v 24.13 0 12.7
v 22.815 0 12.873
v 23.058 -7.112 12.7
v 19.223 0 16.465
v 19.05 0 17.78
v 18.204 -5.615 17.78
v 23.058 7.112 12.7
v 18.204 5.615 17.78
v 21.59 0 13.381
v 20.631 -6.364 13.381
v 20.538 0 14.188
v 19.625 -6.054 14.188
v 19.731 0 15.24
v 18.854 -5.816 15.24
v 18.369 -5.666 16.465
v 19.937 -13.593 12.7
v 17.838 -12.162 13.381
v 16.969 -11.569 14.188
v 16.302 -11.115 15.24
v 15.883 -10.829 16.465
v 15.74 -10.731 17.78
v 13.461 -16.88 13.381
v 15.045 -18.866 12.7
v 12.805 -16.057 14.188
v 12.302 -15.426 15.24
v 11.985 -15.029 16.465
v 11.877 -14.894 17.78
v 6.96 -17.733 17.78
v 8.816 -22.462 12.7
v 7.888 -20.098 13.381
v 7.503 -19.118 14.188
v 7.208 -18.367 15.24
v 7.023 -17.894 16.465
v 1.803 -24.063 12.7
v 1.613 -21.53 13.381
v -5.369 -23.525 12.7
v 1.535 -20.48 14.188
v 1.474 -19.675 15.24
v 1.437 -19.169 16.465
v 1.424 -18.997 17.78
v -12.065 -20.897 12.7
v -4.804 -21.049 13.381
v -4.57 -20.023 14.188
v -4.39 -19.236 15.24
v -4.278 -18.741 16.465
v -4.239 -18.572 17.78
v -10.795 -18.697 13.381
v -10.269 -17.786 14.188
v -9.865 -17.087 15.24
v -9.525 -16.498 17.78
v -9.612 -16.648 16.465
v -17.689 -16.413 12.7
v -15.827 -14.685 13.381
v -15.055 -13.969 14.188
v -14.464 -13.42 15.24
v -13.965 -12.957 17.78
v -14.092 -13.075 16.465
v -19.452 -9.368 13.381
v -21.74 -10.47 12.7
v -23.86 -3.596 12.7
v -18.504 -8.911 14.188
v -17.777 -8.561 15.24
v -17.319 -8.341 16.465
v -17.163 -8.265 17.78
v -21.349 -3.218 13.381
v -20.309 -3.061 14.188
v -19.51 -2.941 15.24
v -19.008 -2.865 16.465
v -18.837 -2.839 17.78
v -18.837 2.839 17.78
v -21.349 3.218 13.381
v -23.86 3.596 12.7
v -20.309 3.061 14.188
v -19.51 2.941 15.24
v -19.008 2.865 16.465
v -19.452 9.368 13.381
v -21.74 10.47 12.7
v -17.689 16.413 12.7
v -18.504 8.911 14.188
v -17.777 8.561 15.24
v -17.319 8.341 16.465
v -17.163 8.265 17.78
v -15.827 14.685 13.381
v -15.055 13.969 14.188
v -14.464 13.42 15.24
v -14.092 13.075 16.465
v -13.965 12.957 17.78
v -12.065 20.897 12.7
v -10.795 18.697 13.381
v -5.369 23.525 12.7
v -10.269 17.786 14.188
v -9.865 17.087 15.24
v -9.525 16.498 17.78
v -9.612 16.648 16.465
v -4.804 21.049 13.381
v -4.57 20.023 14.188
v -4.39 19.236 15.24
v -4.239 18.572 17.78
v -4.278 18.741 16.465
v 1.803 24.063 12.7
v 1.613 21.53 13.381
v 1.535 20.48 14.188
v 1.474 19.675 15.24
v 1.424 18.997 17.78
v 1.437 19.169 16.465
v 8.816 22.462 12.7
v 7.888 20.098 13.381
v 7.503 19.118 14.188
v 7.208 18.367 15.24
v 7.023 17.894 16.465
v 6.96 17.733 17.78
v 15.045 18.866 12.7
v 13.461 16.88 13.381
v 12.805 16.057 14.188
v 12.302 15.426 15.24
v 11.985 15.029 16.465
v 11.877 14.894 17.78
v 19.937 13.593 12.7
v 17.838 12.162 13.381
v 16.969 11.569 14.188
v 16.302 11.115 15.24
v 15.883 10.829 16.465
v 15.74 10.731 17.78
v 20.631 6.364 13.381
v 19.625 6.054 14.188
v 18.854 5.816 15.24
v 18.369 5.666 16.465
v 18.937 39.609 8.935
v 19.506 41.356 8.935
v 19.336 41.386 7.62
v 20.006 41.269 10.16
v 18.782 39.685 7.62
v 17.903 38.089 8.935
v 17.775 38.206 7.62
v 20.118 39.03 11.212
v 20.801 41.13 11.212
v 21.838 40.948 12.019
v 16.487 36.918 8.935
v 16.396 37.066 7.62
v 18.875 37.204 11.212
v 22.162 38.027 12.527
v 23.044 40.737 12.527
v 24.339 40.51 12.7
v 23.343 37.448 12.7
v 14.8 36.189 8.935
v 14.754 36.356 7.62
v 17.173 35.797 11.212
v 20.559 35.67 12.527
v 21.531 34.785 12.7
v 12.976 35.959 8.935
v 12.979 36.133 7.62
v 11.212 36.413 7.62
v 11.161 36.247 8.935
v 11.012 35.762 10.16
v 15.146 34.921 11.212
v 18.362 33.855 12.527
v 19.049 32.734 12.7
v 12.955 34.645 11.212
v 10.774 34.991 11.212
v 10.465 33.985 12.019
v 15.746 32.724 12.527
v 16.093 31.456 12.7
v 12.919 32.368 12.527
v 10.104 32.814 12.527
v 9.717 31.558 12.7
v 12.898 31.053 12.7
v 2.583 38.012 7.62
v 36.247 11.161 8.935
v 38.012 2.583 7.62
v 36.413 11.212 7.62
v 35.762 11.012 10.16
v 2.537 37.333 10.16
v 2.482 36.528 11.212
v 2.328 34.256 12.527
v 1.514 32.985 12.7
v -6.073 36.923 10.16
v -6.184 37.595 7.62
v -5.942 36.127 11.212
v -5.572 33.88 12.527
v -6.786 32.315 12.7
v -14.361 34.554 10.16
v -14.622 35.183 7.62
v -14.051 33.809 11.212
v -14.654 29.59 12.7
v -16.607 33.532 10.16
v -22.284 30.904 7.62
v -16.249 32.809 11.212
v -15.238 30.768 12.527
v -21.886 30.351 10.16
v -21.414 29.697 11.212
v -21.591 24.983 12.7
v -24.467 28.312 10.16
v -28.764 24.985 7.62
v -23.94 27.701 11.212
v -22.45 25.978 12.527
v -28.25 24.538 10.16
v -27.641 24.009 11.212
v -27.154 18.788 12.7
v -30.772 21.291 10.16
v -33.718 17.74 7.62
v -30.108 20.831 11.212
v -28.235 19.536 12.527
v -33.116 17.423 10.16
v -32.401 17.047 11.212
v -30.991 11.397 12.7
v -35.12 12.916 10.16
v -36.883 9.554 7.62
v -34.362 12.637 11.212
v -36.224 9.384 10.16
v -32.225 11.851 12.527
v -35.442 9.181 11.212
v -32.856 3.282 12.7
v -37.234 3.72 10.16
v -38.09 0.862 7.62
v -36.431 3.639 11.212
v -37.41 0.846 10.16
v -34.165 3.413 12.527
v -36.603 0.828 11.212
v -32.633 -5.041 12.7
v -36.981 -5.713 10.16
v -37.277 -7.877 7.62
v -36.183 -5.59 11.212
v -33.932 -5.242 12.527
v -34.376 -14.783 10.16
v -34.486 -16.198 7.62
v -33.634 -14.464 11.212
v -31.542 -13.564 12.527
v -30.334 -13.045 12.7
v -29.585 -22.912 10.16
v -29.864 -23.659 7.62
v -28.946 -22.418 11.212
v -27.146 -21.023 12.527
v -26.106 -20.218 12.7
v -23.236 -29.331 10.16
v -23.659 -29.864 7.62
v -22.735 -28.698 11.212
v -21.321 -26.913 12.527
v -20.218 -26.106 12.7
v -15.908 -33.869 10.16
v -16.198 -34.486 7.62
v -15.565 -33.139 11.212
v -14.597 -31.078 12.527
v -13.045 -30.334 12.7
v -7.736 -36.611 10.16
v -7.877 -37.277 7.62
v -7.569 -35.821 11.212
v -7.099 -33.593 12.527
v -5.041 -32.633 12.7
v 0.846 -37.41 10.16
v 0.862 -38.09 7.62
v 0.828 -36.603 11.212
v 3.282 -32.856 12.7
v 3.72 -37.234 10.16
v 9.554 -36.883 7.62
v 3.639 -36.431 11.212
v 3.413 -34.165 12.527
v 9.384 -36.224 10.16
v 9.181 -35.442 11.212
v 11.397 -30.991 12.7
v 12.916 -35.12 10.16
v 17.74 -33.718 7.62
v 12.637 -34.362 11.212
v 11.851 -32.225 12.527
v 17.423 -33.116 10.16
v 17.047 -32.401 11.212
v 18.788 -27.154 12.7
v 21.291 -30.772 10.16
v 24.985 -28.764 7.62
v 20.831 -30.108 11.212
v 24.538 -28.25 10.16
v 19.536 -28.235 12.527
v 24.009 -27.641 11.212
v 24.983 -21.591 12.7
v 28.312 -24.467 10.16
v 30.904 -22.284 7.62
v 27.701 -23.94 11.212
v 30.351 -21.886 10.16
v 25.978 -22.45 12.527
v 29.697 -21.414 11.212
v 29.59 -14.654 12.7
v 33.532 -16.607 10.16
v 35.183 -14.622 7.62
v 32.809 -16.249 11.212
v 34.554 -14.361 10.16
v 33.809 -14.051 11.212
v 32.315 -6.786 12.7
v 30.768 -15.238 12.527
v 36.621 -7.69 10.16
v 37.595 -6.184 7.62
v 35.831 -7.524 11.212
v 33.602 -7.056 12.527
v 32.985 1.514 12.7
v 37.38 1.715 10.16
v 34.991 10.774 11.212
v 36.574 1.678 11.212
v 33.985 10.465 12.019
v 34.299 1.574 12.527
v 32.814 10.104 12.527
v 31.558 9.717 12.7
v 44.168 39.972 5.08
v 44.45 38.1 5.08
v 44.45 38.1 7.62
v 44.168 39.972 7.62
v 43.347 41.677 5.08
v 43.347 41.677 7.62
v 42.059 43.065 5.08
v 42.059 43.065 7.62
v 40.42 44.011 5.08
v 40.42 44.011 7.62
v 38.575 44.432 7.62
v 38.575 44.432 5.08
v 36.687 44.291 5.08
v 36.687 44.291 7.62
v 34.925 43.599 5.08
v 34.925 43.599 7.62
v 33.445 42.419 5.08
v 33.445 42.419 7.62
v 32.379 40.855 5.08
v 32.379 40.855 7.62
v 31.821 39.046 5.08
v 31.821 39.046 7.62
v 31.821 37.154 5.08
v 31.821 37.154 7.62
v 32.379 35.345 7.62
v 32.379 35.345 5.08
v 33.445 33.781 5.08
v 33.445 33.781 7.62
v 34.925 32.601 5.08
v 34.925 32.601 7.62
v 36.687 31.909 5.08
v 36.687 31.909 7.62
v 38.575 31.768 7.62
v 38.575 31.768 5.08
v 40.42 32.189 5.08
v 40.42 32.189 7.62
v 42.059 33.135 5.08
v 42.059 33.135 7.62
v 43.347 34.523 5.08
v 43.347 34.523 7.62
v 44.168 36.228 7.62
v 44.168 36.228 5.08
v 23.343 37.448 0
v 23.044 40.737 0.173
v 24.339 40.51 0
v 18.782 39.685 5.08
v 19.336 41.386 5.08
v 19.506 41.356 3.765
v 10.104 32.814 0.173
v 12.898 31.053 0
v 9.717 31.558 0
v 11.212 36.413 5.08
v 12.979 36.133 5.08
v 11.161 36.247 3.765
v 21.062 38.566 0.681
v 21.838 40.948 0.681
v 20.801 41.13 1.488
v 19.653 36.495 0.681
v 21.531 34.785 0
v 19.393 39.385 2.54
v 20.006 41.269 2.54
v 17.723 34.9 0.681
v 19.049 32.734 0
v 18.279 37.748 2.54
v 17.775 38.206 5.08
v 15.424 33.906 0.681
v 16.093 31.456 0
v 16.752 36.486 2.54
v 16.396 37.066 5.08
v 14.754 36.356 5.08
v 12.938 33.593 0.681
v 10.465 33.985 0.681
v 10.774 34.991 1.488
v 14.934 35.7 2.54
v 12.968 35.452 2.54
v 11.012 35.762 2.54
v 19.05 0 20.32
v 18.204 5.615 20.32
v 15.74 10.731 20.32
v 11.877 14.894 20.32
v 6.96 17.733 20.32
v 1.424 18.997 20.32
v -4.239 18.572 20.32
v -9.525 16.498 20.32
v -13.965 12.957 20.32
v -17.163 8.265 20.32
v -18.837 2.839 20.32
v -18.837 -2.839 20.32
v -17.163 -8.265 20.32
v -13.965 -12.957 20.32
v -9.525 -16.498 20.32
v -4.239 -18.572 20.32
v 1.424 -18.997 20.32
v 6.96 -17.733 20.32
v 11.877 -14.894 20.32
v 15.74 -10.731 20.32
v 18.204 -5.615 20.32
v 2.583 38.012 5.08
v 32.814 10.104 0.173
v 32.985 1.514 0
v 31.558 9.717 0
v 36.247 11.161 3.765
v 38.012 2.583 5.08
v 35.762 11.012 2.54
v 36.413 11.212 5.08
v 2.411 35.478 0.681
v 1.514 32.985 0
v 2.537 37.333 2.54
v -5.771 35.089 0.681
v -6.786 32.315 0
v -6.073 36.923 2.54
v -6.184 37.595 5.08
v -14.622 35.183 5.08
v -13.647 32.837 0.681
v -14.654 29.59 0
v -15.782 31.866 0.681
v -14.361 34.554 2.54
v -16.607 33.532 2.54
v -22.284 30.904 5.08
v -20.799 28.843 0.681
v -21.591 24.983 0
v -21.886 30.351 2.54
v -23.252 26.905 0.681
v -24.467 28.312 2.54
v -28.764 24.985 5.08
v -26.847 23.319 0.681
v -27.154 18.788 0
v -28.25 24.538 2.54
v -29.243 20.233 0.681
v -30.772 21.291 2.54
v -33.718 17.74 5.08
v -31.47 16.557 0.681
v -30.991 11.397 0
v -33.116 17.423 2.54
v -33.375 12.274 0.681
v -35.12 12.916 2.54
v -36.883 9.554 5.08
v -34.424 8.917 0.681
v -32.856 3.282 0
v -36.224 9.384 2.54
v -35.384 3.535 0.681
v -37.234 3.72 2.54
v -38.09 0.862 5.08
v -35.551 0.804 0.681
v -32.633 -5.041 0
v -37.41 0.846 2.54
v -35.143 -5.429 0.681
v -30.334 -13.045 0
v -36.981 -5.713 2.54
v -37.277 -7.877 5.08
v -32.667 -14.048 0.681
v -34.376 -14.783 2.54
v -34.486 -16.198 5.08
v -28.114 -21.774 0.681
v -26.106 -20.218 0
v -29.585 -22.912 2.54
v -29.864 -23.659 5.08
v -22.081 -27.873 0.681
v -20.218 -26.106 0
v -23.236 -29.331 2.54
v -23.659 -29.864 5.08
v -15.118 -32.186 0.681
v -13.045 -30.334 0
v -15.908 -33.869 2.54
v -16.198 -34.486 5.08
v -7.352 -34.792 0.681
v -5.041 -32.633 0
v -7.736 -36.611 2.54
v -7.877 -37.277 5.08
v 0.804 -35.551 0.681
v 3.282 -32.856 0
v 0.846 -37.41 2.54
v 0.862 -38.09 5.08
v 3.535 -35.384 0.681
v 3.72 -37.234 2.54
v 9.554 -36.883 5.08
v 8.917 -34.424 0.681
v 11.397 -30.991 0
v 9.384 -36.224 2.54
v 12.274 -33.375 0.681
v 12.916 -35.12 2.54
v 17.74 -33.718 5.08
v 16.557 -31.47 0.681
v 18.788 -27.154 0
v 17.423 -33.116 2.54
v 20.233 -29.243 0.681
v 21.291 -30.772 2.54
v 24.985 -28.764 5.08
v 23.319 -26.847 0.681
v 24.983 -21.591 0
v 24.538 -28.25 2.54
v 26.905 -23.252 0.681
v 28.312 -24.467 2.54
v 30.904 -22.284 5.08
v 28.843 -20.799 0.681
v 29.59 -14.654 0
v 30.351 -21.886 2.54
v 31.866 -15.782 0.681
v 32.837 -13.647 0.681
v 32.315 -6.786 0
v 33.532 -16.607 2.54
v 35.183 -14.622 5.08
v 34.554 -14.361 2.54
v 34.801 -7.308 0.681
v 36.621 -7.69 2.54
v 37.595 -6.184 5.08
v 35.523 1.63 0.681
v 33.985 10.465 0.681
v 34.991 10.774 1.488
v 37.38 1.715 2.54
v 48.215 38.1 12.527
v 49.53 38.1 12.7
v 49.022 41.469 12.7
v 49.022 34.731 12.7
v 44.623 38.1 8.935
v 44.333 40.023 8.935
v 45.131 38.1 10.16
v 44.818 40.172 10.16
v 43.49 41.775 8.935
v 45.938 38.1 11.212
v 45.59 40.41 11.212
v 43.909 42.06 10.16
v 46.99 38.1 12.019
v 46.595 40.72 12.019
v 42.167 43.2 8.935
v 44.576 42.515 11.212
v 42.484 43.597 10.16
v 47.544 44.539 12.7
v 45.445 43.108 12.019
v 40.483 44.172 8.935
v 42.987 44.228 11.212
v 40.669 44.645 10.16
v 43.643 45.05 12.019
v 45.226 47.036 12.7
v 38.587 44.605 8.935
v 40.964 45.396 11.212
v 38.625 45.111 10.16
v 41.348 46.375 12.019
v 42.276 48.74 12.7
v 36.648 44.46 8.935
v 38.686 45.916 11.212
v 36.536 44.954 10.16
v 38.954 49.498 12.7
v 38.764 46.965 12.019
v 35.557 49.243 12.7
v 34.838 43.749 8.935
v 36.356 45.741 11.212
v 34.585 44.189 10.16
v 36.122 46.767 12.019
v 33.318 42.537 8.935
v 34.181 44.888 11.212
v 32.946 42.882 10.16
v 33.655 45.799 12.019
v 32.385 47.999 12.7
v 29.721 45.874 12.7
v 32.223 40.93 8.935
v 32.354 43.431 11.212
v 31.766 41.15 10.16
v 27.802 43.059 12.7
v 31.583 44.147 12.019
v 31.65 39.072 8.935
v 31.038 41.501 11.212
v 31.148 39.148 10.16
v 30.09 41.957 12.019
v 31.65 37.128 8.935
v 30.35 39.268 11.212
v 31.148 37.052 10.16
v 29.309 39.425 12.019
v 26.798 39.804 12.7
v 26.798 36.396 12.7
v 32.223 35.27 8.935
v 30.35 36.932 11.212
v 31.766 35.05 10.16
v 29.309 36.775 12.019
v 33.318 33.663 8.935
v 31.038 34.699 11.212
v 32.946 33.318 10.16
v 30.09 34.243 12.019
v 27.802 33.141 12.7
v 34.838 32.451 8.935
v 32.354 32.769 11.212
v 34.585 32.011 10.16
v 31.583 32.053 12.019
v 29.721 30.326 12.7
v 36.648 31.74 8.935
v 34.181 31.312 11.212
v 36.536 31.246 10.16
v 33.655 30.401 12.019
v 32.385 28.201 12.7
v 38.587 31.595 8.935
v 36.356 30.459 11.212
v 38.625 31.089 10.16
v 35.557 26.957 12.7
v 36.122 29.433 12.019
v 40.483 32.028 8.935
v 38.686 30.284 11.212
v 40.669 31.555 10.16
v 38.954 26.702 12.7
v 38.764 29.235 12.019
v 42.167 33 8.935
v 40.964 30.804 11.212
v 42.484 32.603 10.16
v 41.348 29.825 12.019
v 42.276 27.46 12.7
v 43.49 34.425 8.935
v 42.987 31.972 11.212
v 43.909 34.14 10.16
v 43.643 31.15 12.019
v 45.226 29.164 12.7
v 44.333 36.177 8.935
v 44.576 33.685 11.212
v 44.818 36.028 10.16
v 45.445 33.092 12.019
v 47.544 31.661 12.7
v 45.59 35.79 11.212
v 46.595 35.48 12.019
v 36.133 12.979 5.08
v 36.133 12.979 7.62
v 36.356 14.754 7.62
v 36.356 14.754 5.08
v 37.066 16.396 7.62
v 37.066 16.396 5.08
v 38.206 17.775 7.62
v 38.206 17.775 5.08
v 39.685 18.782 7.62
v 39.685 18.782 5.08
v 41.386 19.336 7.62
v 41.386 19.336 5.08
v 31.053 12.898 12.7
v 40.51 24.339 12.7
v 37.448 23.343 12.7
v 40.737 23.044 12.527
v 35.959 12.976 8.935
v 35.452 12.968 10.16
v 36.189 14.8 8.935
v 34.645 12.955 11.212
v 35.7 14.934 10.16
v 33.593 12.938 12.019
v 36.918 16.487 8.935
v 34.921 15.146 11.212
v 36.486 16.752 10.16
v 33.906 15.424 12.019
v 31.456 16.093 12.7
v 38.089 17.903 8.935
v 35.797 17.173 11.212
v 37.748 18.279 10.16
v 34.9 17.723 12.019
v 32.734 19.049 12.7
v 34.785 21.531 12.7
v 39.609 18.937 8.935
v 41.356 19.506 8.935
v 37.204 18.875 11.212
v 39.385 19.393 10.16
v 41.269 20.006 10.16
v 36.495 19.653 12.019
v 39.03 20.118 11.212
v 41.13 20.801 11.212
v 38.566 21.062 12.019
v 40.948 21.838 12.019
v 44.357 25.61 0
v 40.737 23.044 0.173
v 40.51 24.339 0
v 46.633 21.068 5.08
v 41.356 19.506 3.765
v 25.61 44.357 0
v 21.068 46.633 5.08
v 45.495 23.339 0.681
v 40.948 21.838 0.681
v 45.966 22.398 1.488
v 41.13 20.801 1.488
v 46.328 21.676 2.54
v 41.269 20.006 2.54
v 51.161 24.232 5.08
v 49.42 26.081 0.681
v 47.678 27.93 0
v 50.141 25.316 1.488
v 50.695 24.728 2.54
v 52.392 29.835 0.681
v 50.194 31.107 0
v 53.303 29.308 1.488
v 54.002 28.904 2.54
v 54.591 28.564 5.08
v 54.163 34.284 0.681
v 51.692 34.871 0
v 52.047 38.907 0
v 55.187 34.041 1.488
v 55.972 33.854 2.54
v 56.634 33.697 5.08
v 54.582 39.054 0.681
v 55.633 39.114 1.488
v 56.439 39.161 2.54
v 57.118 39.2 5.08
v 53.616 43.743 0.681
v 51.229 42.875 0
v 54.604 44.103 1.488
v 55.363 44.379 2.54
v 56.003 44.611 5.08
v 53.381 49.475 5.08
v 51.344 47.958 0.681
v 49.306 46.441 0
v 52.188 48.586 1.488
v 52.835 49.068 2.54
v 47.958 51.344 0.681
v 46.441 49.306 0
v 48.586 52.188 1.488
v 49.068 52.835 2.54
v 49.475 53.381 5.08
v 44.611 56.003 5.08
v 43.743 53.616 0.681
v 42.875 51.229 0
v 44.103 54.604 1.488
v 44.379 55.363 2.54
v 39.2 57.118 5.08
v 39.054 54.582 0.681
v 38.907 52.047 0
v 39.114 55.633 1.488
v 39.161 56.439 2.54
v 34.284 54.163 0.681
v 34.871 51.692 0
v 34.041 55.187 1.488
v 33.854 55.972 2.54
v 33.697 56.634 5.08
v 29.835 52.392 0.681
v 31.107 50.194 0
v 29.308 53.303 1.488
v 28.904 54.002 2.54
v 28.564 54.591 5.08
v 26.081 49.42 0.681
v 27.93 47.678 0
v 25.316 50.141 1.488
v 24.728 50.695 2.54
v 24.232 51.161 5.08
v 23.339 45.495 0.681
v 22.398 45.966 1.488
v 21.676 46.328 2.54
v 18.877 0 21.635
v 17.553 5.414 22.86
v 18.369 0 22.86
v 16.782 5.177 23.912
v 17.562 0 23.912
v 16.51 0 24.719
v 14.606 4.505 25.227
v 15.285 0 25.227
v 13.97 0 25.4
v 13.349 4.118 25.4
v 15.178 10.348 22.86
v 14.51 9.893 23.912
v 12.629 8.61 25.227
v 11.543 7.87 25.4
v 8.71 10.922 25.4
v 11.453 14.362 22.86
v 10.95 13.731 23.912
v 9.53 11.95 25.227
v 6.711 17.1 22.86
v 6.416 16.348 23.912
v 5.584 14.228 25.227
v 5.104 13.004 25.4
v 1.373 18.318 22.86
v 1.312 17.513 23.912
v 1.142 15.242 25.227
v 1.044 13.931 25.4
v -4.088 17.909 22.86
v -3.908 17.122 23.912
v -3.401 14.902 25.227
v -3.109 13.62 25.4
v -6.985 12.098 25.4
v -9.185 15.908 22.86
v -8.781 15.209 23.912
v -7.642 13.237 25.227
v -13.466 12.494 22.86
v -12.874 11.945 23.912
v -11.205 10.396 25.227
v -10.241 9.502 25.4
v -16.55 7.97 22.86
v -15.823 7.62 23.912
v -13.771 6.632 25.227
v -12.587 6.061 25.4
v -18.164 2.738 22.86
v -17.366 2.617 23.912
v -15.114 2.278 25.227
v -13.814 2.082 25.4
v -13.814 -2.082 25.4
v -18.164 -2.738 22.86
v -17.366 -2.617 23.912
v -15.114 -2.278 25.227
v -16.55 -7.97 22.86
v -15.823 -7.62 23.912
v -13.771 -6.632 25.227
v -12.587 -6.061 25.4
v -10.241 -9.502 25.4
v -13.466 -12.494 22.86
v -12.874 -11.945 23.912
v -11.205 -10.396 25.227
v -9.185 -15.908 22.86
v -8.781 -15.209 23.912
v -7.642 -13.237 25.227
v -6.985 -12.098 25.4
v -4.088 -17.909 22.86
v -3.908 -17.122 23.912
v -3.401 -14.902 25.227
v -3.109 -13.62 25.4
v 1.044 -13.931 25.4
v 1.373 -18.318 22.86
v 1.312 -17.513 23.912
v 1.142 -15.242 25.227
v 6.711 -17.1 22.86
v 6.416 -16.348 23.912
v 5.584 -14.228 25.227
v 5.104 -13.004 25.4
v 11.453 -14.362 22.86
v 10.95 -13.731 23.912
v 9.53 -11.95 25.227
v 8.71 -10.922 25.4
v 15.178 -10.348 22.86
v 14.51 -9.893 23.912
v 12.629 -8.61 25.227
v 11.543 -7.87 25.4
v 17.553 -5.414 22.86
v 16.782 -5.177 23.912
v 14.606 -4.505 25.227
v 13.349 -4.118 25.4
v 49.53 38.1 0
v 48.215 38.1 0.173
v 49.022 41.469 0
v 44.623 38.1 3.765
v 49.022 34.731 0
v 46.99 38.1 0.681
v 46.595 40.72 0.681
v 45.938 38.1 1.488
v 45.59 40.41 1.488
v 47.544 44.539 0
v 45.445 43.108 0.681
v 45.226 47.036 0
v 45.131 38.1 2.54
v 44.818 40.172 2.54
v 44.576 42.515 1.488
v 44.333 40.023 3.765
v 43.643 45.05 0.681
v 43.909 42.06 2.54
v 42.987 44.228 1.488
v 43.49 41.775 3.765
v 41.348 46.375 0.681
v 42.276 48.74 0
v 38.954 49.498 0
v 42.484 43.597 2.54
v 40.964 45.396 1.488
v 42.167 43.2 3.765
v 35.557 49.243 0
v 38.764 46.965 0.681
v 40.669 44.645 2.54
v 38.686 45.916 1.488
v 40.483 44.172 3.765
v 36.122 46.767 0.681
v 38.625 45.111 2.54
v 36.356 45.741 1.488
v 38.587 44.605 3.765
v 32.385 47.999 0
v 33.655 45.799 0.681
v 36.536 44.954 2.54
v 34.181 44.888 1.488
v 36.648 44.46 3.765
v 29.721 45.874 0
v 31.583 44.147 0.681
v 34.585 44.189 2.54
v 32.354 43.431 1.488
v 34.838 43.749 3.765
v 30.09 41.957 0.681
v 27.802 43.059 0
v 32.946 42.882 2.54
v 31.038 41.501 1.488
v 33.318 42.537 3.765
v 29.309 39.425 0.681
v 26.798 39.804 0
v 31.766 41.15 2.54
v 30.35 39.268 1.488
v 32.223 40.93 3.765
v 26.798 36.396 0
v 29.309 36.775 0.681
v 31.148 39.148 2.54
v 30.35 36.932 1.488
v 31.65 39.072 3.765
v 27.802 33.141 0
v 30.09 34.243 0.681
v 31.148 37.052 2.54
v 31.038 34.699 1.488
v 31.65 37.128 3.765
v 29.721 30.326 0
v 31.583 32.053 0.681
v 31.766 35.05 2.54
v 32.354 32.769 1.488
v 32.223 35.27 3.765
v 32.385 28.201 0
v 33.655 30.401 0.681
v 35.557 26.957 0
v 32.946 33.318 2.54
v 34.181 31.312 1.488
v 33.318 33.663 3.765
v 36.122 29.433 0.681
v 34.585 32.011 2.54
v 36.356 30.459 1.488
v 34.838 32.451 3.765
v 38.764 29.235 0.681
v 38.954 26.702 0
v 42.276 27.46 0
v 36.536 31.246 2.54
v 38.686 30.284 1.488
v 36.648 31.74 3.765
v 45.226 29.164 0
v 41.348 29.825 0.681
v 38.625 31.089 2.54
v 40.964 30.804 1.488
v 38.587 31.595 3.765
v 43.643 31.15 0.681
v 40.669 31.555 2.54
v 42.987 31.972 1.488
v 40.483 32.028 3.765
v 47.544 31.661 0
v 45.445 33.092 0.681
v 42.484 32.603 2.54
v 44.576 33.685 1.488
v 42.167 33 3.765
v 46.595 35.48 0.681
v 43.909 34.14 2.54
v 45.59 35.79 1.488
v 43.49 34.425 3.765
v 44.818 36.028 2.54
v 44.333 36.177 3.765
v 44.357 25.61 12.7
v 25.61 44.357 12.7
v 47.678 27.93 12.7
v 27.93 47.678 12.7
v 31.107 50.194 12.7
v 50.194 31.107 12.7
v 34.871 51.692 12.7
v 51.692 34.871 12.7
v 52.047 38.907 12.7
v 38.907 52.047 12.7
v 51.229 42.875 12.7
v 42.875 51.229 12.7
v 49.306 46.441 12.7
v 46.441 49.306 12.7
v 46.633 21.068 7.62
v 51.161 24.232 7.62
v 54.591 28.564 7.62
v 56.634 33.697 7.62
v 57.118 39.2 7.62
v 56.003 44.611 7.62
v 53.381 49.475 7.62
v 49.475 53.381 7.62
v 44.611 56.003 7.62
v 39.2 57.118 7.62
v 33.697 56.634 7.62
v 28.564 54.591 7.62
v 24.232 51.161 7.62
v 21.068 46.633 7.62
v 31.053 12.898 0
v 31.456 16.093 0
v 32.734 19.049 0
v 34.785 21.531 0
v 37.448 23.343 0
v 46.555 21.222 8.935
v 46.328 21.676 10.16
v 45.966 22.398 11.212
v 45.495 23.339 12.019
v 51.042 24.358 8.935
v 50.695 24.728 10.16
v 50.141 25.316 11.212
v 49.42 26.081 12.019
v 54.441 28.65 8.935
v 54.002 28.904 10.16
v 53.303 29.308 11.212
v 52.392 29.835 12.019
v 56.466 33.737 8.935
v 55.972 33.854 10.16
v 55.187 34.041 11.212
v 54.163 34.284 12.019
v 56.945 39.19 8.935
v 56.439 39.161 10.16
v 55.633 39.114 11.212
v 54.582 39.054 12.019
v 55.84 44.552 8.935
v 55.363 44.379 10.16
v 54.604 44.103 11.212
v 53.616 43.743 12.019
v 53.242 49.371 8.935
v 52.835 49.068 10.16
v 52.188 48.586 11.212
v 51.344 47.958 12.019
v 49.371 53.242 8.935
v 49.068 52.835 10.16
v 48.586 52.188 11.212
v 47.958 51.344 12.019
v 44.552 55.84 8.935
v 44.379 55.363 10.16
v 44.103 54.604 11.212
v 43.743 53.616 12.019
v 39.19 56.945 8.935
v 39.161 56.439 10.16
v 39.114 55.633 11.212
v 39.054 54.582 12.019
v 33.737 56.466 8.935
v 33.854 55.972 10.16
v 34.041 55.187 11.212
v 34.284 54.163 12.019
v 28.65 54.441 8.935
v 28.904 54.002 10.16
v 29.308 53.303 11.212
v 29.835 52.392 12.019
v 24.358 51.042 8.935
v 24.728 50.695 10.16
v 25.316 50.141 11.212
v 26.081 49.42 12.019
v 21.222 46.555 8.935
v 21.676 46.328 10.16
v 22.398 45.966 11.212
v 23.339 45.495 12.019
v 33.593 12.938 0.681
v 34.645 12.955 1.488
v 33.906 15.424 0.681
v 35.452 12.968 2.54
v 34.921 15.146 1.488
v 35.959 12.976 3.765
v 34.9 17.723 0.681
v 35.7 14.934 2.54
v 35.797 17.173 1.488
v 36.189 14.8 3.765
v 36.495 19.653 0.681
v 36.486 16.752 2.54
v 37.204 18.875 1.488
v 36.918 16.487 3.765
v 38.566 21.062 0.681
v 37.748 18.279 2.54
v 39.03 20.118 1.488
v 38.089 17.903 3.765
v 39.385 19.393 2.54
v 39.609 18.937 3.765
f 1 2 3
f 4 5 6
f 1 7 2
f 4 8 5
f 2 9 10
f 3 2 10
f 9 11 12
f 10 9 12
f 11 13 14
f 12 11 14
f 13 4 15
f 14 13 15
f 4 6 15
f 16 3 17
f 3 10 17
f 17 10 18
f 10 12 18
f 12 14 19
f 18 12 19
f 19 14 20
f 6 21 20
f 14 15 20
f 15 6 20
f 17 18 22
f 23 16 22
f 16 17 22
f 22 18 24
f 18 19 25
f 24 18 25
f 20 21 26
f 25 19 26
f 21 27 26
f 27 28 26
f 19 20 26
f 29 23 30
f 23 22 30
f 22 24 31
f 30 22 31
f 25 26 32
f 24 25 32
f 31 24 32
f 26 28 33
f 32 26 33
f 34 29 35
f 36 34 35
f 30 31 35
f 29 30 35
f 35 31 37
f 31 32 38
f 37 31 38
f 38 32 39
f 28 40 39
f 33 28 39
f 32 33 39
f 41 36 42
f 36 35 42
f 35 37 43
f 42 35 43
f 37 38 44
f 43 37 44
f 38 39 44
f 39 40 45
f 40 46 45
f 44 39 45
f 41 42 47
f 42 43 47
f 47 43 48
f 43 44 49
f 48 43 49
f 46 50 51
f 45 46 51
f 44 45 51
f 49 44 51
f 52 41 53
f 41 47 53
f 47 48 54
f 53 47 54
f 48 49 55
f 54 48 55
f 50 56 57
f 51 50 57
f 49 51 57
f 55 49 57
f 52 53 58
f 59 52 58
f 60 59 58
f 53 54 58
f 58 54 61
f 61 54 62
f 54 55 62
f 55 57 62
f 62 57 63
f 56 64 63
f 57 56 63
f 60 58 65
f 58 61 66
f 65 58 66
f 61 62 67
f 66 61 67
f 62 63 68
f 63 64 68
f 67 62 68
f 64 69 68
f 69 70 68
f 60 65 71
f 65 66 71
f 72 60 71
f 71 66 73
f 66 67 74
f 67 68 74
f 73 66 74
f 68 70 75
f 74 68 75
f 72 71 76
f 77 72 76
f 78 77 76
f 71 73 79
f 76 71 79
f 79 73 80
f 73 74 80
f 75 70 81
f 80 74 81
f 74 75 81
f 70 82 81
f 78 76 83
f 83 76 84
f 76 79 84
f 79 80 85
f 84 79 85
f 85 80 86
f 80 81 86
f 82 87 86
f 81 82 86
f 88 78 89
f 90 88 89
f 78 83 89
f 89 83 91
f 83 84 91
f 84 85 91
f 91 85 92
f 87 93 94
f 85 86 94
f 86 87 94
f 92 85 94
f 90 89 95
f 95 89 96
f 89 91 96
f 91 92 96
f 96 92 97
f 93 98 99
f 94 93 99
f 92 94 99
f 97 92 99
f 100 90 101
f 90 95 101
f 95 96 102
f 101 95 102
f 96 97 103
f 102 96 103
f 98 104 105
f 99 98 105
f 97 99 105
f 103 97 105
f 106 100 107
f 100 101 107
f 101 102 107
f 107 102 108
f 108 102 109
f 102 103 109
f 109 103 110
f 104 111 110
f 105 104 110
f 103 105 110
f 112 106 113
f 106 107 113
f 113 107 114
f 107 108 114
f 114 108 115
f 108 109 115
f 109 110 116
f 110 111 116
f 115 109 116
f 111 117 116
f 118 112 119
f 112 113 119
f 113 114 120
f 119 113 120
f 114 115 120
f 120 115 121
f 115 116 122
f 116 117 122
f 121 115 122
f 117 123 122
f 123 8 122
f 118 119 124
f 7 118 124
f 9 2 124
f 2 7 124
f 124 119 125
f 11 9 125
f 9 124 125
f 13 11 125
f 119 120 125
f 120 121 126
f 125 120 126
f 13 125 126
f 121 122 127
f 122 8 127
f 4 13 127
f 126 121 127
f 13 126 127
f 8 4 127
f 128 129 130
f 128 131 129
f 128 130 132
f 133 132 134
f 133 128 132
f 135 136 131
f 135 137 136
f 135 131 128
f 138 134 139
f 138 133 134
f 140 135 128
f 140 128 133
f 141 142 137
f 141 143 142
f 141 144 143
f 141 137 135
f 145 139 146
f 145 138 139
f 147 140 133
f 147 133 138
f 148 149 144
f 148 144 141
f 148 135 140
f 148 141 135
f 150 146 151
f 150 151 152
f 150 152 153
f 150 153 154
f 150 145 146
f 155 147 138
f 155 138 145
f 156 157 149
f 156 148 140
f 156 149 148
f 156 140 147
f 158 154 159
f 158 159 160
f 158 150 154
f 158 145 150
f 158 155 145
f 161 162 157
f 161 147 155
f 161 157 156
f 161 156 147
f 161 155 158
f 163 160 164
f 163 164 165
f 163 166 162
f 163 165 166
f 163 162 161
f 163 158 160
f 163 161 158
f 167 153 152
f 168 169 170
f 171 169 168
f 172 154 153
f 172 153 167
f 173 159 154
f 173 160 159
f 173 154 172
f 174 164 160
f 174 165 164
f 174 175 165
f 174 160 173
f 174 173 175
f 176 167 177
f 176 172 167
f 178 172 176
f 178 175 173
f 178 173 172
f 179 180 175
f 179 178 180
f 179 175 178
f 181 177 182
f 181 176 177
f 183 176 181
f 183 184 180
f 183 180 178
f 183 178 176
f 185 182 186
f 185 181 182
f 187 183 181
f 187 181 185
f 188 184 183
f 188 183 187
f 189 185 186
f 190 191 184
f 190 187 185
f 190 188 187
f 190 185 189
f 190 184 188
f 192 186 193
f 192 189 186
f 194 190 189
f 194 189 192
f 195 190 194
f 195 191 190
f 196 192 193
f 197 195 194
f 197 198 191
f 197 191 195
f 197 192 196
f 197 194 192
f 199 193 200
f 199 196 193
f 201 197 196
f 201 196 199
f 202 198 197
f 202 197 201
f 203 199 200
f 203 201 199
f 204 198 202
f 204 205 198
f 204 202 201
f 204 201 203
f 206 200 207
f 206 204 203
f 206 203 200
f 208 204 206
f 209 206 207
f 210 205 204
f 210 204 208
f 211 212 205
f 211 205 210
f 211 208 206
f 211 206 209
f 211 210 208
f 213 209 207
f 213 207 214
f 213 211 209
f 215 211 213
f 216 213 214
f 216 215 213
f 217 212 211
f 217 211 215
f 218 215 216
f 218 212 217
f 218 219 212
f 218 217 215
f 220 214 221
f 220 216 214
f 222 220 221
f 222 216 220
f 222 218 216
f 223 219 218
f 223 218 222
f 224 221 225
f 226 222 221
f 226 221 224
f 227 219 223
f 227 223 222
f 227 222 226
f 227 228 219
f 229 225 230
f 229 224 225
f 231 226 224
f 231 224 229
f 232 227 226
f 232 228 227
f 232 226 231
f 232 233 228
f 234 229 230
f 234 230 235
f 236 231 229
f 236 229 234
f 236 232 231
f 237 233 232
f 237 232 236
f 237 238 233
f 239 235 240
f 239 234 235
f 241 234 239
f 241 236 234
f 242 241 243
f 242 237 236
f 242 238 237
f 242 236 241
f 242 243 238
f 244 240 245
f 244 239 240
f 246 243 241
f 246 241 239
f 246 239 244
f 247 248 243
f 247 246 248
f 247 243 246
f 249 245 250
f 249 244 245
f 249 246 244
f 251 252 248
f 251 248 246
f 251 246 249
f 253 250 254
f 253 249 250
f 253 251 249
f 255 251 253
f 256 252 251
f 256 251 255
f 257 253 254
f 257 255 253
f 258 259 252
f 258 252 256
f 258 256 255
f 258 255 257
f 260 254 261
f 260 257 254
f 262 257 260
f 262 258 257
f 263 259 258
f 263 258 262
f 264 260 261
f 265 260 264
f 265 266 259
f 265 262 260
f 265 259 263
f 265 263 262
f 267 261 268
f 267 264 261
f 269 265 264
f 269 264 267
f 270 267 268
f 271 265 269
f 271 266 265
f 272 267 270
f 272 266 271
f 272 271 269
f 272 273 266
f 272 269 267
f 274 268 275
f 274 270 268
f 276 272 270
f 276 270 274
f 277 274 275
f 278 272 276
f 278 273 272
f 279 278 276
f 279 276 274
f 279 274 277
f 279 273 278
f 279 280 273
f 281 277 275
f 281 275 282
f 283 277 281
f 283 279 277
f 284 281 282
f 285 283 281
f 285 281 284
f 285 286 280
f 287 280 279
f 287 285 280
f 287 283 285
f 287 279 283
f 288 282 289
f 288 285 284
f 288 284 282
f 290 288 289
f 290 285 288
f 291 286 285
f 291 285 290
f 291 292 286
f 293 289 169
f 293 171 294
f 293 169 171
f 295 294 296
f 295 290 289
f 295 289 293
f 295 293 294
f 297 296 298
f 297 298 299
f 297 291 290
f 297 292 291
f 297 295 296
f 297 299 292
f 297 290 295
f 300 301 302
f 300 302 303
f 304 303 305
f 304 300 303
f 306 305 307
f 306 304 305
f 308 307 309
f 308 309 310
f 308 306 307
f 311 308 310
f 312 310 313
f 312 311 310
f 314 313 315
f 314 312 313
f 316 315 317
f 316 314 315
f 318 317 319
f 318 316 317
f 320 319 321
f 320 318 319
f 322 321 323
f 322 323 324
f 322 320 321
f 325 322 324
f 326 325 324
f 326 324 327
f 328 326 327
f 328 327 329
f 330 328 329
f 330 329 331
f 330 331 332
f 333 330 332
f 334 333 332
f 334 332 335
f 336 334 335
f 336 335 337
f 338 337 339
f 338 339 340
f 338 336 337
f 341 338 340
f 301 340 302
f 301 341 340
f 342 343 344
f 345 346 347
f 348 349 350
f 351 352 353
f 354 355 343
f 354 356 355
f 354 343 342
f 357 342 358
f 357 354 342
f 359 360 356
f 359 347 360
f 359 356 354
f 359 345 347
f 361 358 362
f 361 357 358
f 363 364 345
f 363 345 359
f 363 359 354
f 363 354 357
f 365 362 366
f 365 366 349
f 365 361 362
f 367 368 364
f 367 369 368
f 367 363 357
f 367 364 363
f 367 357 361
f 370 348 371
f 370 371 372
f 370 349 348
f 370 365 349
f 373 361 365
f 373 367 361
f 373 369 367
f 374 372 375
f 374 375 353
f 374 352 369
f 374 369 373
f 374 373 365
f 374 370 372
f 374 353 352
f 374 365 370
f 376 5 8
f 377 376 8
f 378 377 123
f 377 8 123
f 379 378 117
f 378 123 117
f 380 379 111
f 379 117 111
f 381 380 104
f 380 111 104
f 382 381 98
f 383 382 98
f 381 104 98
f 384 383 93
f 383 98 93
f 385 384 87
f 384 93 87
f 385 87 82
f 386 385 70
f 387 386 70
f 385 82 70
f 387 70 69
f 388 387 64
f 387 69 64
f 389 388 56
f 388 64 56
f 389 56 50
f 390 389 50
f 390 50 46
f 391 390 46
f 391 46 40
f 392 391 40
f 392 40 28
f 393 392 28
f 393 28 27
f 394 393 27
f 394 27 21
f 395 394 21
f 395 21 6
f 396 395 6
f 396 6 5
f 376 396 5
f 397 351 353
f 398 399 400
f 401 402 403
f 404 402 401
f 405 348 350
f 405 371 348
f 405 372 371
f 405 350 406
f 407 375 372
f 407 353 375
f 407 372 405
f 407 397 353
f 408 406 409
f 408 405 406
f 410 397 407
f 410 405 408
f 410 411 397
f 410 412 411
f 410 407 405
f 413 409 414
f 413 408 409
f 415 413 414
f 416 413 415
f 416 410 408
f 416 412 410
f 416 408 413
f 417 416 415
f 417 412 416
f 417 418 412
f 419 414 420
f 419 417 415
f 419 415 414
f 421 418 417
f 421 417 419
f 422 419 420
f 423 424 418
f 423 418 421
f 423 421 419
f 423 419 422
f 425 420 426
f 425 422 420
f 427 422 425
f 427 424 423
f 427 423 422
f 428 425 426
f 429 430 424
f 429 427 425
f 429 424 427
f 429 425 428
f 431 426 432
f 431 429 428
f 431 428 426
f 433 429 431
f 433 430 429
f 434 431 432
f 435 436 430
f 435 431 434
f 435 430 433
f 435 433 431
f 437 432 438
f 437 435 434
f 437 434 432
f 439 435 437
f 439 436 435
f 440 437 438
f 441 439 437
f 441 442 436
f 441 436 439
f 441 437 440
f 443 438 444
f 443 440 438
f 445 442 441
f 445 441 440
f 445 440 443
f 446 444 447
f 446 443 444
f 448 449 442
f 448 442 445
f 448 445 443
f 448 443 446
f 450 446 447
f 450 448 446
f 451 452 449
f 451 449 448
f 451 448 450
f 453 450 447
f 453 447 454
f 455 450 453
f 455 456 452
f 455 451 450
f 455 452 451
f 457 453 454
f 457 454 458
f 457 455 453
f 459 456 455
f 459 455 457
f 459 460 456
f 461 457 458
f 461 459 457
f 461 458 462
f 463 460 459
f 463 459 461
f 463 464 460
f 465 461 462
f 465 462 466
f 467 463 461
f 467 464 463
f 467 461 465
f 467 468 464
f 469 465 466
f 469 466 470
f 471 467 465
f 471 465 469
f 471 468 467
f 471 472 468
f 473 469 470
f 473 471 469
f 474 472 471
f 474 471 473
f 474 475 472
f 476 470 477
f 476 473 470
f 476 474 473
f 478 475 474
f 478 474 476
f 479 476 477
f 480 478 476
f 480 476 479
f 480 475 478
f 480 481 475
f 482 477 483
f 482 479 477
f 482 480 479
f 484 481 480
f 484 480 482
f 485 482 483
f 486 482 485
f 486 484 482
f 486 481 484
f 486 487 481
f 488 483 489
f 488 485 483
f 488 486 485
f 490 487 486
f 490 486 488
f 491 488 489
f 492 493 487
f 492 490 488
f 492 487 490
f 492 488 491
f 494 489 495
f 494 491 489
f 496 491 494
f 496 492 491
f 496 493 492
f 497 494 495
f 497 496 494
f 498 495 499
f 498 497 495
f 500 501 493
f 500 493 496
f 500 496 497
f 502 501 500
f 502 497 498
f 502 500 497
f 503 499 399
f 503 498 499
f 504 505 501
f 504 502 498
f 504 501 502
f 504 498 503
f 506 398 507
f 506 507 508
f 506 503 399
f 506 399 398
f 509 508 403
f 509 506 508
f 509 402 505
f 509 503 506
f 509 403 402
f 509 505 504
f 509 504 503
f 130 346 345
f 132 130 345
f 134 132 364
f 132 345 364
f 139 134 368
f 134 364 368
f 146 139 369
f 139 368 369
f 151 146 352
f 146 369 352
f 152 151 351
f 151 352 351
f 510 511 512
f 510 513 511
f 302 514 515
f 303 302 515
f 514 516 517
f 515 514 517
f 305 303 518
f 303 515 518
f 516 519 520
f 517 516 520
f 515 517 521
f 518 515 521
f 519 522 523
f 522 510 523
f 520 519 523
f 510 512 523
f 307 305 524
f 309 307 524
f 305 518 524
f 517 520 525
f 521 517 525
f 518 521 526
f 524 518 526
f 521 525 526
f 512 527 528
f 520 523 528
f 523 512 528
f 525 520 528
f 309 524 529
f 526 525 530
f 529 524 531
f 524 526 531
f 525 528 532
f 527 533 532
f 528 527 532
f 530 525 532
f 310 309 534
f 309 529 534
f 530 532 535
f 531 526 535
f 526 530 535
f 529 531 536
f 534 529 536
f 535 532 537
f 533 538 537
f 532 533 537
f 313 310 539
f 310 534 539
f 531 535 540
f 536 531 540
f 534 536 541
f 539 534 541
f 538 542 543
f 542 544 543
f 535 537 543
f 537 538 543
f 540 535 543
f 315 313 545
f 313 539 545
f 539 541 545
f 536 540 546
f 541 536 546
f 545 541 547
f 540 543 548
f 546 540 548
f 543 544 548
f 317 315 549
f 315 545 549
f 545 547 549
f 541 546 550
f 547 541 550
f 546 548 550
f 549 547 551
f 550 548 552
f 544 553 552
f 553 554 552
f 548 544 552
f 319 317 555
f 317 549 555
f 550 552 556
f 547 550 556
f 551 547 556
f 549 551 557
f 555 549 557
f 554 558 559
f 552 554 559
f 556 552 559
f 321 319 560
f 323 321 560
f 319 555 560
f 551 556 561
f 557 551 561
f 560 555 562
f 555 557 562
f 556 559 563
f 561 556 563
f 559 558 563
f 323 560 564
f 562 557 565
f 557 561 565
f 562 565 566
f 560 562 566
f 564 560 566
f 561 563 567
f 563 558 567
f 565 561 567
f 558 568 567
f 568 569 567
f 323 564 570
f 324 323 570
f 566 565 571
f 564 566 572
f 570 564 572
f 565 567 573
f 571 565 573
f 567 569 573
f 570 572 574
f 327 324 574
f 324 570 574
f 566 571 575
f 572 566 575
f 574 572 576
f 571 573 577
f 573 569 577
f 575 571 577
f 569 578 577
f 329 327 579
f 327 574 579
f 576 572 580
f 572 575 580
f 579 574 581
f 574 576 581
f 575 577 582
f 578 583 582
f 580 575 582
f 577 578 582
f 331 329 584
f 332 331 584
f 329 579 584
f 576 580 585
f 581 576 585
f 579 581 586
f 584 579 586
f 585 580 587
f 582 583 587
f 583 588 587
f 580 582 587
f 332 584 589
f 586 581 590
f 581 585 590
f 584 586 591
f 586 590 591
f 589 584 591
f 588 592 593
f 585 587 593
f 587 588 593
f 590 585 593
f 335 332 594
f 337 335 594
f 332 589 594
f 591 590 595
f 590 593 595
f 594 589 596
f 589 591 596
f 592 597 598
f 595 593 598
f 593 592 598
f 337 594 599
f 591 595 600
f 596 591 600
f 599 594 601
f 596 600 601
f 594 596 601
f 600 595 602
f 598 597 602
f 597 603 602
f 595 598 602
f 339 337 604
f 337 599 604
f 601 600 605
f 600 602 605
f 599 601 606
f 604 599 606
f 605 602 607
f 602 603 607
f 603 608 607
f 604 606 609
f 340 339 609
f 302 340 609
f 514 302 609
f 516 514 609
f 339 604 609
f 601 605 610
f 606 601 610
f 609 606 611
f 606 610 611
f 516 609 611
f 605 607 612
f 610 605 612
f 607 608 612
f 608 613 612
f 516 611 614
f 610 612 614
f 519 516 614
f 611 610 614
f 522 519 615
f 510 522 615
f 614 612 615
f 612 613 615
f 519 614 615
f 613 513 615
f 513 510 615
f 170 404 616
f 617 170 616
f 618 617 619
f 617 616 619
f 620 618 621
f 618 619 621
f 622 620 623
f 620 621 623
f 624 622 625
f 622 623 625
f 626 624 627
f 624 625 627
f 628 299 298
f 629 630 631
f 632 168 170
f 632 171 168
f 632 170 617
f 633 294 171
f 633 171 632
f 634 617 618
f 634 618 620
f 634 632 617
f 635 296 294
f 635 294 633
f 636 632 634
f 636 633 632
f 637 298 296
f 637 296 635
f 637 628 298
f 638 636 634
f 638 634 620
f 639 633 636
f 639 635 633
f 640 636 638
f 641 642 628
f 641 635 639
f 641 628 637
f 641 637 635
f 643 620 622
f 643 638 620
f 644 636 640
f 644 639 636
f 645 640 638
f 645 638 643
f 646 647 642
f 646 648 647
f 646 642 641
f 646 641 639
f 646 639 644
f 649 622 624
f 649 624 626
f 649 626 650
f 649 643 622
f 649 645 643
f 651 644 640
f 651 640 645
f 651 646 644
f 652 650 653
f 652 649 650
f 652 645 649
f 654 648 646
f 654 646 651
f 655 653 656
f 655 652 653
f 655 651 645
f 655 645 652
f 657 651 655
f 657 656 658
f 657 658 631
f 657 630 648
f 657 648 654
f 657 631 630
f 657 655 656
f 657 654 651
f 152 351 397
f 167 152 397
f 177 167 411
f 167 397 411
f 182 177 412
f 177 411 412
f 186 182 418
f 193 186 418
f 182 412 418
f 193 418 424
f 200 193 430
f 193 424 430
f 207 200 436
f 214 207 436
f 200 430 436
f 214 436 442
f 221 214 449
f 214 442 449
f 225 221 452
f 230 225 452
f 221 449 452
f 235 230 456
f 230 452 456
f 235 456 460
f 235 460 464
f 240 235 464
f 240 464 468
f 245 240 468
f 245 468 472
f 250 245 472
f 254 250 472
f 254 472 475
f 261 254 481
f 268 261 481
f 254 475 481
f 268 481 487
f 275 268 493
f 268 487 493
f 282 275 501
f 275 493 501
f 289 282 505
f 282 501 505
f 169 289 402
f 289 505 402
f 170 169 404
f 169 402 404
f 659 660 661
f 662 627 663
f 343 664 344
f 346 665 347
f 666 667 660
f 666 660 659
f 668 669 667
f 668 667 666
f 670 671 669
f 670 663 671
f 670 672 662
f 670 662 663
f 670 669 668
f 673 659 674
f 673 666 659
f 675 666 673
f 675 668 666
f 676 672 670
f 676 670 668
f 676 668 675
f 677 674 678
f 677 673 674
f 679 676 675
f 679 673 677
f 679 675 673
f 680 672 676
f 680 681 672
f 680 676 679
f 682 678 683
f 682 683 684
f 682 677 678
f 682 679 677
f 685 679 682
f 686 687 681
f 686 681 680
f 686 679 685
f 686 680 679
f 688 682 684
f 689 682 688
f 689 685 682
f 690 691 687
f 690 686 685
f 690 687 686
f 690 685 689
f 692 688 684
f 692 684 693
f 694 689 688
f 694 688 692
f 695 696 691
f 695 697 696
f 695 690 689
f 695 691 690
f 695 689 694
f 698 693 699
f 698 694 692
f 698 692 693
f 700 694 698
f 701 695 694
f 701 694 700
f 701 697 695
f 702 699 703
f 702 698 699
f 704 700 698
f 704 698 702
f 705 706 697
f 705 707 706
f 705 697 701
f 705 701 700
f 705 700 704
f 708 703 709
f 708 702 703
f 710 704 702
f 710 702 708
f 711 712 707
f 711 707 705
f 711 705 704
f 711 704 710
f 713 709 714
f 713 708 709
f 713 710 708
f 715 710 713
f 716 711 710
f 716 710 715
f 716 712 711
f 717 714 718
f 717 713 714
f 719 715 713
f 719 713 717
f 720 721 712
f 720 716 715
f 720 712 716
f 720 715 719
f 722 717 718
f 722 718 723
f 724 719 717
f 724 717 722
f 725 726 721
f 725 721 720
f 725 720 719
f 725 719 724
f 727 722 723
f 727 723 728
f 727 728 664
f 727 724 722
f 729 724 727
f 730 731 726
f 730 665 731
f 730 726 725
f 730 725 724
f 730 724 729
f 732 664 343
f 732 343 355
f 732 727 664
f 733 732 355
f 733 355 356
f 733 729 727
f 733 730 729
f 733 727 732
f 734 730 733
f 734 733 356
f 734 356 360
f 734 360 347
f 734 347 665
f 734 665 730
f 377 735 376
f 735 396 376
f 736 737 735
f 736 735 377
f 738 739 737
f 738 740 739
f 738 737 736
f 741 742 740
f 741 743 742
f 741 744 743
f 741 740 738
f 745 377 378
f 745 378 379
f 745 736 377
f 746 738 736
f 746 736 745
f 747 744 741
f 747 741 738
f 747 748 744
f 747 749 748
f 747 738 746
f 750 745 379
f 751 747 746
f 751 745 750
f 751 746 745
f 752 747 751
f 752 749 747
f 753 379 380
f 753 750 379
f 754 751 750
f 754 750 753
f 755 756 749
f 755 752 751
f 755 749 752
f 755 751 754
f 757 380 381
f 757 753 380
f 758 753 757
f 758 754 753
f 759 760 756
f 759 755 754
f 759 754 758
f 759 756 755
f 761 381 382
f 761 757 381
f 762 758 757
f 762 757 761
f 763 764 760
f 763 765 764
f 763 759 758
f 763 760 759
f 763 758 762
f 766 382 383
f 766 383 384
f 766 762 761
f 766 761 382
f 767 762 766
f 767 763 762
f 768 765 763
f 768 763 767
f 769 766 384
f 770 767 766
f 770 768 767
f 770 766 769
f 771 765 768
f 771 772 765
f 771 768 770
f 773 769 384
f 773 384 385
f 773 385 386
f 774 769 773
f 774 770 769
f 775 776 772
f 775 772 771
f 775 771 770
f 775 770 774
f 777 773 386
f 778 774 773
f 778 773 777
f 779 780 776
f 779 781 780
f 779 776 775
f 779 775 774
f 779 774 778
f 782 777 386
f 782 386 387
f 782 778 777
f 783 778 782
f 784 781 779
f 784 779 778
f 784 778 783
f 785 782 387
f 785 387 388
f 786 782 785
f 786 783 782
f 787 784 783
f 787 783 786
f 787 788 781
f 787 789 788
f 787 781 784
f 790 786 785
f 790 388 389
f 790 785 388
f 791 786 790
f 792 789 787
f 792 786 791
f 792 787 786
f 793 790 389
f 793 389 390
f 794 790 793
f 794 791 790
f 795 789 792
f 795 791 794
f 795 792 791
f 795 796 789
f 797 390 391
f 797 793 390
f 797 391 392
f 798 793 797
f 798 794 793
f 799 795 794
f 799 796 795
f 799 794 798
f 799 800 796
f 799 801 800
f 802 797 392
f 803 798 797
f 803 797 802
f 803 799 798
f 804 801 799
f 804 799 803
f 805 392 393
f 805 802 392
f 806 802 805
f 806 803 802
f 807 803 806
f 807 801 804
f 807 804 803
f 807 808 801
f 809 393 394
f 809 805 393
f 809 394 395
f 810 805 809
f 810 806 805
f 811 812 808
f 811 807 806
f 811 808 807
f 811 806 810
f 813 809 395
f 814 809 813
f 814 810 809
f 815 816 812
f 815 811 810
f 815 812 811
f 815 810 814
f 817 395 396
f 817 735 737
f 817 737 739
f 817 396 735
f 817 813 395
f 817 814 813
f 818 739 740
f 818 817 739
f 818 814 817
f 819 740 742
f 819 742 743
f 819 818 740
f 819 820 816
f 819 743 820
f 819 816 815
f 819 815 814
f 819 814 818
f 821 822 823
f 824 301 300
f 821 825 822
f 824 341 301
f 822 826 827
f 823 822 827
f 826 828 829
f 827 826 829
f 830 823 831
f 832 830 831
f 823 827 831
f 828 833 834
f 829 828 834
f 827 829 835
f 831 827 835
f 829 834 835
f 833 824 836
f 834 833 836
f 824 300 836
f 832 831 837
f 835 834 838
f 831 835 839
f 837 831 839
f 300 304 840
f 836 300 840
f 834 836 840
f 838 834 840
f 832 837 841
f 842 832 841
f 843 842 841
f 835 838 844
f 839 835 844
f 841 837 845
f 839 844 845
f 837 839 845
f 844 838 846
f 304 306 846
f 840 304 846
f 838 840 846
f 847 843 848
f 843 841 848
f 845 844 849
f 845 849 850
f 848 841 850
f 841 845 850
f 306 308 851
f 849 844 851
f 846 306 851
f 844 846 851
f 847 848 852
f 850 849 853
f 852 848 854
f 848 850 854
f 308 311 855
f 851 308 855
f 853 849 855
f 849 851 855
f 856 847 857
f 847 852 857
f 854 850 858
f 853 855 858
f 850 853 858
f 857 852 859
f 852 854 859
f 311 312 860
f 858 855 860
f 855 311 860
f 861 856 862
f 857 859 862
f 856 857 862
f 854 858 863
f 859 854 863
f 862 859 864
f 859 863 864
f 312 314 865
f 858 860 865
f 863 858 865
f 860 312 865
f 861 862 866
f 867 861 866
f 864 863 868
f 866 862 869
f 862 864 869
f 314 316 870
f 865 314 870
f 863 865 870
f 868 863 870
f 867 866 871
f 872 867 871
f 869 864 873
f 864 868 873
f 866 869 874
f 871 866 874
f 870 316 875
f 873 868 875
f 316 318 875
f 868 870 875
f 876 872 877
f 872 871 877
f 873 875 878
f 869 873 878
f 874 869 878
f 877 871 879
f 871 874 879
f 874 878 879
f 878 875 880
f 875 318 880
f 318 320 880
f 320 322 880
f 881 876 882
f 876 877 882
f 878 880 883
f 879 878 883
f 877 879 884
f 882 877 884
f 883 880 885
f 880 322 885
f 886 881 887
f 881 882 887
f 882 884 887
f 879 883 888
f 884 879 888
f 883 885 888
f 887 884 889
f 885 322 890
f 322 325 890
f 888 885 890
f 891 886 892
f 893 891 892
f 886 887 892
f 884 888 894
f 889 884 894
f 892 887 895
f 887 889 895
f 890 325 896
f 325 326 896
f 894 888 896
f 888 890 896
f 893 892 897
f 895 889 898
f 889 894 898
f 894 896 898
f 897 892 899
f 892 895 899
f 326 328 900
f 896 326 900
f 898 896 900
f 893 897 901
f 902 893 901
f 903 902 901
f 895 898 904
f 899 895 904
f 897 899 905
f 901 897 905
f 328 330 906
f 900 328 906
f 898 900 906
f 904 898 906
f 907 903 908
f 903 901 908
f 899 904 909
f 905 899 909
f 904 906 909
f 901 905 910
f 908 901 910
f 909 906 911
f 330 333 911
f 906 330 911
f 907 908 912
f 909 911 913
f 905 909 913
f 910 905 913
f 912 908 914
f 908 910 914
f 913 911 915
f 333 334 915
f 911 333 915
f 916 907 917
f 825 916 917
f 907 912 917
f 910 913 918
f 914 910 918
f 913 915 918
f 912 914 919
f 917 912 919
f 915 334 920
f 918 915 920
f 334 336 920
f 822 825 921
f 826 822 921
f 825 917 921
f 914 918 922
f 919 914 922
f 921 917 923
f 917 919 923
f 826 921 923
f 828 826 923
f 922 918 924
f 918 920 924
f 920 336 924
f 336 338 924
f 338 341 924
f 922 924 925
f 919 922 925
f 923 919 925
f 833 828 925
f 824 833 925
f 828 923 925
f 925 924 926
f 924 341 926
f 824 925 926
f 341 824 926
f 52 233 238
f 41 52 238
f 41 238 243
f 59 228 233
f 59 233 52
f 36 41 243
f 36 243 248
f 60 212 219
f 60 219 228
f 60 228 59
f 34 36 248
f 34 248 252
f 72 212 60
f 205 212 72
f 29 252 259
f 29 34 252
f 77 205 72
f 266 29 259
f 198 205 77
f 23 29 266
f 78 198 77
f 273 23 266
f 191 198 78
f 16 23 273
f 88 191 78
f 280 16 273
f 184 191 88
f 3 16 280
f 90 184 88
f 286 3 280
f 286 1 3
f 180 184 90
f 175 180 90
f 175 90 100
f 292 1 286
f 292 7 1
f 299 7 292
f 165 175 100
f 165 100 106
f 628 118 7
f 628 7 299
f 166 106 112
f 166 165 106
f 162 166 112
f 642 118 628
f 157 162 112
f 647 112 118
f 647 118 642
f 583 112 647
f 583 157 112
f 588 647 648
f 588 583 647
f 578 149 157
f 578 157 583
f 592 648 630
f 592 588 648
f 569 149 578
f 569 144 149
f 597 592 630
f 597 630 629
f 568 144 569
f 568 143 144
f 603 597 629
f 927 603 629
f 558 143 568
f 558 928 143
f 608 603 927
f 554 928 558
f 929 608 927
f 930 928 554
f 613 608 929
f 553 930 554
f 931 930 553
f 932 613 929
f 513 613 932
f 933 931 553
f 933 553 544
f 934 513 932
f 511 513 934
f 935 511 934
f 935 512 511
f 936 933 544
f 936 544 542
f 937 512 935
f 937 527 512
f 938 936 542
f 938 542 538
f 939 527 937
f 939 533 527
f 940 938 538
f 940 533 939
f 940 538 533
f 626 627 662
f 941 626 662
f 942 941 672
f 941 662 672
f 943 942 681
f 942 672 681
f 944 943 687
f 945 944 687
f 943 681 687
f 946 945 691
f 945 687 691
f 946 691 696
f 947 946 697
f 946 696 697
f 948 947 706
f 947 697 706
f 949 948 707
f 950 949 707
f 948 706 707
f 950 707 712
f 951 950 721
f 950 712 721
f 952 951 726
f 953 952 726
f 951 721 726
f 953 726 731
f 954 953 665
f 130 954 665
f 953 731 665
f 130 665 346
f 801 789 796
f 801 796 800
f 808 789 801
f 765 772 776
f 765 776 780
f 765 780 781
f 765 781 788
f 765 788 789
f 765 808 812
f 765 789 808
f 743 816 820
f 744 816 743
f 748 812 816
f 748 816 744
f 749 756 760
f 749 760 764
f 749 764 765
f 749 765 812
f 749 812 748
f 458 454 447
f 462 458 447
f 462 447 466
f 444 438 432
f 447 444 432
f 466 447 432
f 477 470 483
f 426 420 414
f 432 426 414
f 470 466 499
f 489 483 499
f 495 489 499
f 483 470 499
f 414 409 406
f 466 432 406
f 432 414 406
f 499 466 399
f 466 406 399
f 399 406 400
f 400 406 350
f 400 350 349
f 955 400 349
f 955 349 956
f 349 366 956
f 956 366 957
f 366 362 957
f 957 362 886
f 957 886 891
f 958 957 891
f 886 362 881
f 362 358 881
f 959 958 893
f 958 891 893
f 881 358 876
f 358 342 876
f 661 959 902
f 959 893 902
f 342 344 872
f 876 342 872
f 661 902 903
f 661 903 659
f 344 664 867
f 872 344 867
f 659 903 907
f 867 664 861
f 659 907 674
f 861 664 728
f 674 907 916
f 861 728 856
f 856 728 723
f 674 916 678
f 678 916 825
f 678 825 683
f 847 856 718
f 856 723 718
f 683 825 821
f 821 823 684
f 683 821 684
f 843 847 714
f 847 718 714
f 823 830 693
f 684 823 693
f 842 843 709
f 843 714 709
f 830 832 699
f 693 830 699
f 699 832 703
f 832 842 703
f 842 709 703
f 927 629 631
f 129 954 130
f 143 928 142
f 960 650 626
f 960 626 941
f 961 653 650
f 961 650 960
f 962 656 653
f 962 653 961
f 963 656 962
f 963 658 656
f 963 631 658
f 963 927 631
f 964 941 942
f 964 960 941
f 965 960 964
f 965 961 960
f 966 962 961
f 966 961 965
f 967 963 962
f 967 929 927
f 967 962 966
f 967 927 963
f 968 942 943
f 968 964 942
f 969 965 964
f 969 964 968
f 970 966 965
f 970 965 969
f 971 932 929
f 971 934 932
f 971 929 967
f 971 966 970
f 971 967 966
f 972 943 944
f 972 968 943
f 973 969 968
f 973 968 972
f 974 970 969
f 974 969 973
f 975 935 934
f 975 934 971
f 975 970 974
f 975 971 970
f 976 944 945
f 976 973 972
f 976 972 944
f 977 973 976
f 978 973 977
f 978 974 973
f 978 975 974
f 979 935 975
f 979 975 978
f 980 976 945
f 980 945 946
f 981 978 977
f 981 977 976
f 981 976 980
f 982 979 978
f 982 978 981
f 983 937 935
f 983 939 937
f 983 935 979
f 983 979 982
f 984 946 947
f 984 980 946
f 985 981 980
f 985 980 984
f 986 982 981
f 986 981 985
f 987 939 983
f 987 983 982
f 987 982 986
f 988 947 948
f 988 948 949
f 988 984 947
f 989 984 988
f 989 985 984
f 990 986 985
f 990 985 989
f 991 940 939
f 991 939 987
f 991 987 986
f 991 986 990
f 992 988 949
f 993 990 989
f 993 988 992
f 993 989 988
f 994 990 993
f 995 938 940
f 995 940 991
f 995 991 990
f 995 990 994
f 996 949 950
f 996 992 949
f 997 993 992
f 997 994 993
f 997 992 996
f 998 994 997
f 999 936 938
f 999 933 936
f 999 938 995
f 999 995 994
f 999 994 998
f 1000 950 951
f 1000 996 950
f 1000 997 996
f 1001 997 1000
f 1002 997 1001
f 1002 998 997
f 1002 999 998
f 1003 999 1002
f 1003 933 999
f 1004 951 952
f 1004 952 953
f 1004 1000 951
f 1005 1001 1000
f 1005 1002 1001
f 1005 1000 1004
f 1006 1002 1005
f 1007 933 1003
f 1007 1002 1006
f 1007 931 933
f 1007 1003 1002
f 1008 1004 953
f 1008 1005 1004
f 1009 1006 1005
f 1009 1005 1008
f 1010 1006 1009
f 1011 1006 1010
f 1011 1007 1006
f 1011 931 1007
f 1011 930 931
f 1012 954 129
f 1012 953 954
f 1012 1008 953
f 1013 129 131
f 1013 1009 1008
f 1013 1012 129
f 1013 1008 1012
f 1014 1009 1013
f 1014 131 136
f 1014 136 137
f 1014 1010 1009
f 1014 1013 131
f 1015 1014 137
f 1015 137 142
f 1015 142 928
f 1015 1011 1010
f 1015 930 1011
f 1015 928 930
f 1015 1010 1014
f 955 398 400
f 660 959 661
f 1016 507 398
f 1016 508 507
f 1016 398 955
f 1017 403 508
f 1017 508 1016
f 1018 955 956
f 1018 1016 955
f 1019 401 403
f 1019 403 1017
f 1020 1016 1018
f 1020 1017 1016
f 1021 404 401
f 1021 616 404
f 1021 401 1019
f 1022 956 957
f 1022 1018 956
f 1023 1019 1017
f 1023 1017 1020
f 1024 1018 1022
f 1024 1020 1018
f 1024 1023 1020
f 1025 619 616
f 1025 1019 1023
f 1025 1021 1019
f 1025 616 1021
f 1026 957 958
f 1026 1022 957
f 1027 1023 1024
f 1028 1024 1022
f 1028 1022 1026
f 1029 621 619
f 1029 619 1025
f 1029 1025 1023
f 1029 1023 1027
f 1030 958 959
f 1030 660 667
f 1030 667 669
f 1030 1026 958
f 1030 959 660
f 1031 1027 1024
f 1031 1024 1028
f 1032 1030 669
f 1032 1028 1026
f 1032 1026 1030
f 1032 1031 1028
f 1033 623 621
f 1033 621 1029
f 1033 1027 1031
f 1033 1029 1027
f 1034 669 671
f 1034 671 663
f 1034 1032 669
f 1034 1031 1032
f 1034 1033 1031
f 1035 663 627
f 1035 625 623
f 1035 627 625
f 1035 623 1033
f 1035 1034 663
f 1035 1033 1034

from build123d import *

# Parameters (mm, degrees)
F0_R     = 6.35
F2_DEPTH = 12.7
F1_R     = 19.05
F3_DEPTH = 25.4
F4_R     = 5.08


with BuildPart() as f2:
    # F0 (on Top) → F2 (new body)
    with BuildSketch(Plane.XY):
        with BuildLine():
            ThreePointArc((19.335596, 41.386279), (16.396387, 37.066048), (11.212109, 36.412891))
            ThreePointArc((11.212109, 36.412891), (-26.940768, -26.940768), (36.412891, 11.212109))
            ThreePointArc((36.412891, 11.212109), (37.066048, 16.396387), (41.386279, 19.335596))
            ThreePointArc((41.386279, 19.335596), (51.570384, 51.570384), (19.335596, 41.386279))
        make_face()
        with Locations((38.1, 38.1)):
            Circle(F0_R, mode=Mode.SUBTRACT)
    extrude(amount=F2_DEPTH)

    # F1 (on Top) → F3 (join)
    with BuildSketch(Plane.XY):
        Circle(F1_R)
    extrude(amount=F3_DEPTH)

    # F4
    f4_edges = [f2.edges().sort_by_distance(p)[0] for p in [
        (-19.05, 0, 25.4),
        (-26.940768, -26.940768, 12.7),
        (-26.940768, -26.940768, 0),
        (-19.05, 0, 12.7),
        (31.75, 38.1, 12.7),
        (31.75, 38.1, 0),
    ]]
    fillet(f4_edges, radius=F4_R)


solid = f2.part
